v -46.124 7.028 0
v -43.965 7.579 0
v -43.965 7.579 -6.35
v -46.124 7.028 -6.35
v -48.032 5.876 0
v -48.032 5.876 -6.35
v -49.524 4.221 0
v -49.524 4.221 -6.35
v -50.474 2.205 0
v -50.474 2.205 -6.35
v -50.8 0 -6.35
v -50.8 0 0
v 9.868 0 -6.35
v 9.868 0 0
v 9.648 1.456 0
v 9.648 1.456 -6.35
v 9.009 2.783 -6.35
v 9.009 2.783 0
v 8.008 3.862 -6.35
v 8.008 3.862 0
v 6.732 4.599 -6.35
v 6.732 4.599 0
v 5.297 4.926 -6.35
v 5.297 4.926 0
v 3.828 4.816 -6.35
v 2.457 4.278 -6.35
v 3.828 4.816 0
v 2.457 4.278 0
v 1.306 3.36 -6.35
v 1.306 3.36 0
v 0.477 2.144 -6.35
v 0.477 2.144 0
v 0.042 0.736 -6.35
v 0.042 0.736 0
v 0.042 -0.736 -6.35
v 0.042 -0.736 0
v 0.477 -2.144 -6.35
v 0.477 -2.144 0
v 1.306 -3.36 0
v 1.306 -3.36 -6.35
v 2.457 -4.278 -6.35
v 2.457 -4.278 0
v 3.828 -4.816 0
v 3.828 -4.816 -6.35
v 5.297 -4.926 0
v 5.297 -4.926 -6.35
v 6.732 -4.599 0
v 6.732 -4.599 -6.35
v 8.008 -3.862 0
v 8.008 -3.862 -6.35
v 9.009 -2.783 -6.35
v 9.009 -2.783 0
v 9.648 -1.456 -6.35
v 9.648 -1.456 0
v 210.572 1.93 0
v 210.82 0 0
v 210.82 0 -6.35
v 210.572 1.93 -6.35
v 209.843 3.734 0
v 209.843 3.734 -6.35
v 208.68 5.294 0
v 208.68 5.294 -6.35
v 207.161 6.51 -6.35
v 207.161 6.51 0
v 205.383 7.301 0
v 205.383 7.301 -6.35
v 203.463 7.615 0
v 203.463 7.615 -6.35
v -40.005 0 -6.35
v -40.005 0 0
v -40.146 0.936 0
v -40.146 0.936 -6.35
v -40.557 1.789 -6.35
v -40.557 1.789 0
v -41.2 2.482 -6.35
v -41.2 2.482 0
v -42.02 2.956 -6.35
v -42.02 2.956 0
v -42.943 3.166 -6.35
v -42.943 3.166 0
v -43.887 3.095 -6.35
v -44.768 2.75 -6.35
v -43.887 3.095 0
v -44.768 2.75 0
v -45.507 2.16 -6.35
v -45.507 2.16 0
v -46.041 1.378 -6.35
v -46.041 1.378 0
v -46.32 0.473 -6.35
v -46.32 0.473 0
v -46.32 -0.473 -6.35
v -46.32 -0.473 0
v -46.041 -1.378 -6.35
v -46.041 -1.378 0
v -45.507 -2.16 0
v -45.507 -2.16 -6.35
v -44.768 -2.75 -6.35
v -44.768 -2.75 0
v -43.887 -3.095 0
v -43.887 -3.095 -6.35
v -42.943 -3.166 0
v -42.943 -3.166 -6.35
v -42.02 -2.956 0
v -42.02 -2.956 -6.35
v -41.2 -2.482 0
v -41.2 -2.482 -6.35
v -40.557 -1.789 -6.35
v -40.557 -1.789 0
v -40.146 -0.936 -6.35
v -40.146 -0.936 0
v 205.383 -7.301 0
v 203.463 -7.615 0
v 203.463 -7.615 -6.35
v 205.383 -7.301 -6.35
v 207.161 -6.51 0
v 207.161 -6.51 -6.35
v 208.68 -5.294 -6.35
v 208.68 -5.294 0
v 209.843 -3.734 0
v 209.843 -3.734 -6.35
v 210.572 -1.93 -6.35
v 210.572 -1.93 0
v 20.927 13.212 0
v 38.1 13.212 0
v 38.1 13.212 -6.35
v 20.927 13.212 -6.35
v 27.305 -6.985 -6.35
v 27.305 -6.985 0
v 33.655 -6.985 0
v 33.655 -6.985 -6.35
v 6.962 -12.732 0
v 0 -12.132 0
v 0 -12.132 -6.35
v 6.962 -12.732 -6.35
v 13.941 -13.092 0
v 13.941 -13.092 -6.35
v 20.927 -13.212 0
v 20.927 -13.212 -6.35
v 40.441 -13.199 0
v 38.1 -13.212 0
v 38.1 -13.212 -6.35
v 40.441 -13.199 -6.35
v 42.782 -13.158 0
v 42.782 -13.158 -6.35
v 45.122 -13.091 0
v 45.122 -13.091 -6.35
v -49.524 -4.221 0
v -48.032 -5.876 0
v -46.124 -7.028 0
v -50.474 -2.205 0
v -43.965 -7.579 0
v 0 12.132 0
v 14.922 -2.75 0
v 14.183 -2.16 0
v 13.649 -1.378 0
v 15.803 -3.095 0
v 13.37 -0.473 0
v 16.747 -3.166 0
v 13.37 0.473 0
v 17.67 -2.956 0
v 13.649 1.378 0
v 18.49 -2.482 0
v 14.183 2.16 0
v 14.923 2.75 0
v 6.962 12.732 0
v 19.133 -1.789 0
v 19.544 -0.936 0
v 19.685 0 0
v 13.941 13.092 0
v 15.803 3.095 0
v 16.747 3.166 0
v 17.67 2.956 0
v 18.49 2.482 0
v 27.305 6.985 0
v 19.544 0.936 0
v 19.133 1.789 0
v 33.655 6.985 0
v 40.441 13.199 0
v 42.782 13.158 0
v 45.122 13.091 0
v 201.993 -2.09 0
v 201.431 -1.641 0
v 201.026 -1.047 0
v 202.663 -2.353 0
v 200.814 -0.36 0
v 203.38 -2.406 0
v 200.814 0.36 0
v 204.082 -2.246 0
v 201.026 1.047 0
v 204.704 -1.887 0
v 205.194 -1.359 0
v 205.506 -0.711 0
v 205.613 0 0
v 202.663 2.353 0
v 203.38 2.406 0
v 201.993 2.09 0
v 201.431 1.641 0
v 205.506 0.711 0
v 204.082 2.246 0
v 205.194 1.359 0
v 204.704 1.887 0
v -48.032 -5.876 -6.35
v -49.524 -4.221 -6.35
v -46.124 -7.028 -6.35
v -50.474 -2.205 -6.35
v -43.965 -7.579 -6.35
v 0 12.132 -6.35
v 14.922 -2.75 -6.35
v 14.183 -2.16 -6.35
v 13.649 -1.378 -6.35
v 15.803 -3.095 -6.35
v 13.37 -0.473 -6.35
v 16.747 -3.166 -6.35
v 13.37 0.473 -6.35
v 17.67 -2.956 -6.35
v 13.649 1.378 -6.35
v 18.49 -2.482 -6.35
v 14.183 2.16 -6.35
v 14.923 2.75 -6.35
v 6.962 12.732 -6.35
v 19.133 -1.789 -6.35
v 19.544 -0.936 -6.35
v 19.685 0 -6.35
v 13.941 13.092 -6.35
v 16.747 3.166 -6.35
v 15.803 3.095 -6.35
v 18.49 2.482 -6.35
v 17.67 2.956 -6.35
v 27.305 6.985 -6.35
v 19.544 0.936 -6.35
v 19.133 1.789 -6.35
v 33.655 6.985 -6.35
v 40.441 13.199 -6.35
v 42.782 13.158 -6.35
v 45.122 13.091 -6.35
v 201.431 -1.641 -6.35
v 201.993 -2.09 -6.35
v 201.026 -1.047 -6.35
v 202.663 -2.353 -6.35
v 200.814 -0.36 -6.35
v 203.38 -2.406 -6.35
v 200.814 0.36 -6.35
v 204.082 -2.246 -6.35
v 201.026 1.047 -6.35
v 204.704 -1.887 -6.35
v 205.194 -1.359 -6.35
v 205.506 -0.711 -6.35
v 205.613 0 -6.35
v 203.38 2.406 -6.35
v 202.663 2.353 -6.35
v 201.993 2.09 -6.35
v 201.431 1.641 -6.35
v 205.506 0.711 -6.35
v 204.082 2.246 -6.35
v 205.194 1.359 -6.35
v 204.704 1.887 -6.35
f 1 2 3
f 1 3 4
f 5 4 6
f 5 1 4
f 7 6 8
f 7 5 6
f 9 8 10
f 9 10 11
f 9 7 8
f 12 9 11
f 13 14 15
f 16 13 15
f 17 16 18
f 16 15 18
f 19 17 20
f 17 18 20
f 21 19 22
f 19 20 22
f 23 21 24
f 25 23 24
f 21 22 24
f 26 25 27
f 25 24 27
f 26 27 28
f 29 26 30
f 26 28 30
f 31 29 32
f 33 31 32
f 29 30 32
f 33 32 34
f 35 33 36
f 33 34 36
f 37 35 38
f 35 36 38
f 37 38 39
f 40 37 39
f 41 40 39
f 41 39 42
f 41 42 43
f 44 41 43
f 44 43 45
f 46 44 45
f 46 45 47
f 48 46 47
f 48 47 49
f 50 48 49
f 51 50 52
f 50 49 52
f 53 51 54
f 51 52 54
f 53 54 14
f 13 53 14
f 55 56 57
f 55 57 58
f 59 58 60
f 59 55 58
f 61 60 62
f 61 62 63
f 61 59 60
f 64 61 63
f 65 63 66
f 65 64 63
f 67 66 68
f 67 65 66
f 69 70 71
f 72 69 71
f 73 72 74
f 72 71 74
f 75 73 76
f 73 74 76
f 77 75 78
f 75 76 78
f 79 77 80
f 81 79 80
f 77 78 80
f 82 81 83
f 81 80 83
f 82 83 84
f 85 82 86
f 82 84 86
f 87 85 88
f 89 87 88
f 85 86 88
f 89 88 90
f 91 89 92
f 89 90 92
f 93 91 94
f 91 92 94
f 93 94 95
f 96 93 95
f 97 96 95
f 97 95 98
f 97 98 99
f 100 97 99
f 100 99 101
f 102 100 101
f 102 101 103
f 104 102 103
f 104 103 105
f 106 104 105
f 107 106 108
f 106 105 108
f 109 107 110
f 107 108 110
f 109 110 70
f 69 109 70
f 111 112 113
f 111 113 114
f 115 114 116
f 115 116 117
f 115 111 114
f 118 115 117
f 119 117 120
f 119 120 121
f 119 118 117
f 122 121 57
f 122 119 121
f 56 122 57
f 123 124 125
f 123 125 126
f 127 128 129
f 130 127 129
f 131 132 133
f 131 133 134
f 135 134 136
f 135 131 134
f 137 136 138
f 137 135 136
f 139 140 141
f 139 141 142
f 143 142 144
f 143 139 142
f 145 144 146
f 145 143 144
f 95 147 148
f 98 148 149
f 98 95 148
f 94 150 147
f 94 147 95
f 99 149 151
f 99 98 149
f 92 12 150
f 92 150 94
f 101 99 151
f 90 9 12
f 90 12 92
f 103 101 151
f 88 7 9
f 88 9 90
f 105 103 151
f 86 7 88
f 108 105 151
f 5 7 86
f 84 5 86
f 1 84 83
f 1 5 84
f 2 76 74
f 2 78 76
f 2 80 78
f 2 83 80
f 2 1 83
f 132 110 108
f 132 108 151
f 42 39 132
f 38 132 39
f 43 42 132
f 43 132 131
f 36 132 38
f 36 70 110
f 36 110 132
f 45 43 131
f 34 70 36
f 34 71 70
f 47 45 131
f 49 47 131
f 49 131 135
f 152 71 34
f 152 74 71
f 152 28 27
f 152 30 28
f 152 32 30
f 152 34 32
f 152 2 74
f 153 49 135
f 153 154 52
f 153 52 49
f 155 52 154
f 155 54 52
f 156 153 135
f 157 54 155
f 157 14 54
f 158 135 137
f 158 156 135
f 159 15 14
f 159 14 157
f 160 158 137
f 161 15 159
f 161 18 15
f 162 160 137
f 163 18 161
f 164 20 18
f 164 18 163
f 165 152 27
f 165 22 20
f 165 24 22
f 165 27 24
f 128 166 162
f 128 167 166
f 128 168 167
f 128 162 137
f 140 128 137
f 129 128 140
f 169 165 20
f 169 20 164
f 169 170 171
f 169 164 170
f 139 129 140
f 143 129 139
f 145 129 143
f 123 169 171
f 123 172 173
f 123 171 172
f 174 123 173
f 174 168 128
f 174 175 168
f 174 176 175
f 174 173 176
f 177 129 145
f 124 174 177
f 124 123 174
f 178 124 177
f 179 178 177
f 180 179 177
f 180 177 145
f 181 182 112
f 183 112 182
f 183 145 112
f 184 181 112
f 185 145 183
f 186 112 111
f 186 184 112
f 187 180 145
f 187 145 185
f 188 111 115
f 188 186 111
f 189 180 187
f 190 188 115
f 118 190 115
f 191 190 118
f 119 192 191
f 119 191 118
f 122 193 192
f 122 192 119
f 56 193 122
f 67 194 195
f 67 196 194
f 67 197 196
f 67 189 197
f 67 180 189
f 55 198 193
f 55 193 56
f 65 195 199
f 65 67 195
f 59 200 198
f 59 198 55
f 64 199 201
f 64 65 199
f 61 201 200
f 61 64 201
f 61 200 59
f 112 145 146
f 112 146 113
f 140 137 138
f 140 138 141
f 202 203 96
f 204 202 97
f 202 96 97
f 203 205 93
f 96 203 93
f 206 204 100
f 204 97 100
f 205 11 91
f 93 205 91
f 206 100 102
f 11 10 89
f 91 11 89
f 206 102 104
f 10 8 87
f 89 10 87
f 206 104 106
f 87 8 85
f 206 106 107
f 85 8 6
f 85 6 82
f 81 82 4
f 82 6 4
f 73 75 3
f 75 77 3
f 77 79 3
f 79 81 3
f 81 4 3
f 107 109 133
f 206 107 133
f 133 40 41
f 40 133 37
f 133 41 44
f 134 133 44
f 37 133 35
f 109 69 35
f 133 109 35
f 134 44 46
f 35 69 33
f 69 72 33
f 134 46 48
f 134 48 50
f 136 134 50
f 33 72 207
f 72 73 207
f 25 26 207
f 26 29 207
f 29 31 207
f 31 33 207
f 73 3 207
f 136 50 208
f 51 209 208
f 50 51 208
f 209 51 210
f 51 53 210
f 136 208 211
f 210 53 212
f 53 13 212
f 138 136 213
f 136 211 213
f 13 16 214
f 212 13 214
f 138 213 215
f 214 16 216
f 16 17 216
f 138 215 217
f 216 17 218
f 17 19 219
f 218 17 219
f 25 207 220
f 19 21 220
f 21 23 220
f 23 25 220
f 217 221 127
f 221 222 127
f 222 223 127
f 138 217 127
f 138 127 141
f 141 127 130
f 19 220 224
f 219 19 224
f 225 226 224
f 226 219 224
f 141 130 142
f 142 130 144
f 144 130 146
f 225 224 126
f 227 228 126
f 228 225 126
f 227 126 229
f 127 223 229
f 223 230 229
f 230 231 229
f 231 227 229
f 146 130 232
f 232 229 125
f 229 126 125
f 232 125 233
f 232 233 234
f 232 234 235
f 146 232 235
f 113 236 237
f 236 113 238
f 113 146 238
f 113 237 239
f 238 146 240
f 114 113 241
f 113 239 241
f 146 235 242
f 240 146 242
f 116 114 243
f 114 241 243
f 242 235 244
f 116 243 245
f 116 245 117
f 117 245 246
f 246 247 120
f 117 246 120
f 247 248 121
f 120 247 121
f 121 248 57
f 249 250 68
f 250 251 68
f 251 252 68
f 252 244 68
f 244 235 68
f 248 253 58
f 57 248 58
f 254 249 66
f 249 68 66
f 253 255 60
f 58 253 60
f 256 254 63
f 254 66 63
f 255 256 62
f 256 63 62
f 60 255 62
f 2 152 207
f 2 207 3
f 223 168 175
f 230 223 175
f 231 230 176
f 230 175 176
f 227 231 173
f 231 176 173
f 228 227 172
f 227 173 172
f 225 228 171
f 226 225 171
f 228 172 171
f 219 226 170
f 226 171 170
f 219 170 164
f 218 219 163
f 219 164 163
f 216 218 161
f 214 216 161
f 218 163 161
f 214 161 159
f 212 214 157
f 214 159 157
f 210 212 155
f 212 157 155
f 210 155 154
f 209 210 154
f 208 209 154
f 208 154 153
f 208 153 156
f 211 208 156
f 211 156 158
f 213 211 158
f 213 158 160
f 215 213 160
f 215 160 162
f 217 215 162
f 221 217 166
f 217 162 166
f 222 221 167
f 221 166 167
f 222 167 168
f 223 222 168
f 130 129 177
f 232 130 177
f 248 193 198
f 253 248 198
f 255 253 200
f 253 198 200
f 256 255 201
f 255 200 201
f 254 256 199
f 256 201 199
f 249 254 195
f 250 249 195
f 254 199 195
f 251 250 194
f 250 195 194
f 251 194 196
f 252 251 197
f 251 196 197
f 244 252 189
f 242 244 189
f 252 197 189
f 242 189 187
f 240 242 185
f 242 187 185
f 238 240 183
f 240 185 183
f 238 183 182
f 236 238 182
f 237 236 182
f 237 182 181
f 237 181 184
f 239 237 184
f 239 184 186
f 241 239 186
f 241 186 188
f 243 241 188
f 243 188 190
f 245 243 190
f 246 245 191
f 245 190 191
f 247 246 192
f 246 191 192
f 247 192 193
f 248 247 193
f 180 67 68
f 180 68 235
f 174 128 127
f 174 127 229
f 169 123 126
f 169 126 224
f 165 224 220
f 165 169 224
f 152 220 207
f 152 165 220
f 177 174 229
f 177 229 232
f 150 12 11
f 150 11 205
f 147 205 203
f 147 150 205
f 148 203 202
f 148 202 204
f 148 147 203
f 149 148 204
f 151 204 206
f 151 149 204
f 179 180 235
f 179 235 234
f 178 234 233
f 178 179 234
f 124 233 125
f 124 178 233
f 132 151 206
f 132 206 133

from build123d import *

# Parameters (mm, degrees)
F2_DEPTH = 6.35
F3_R     = 3.175
F3_R_2   = 4.9403
F3_R_3   = 2.413
F4_DEPTH = 6.35
F5_W     = 6.35
F5_H     = 13.97
F6_DEPTH = 6.35


with BuildPart() as f2:
    # F1 (on Top) → F2 (new body)
    with BuildSketch(Plane.XY):
        with BuildLine():
            Line((38.1, 13.212064), (20.927279, 13.212064))
            ThreePointArc((20.927279, 13.212064), (10.449702, 12.941757), (0, 12.131556))
            Line((0, 12.131556), (-43.964773, 7.579481))
            ThreePointArc((-43.964773, 7.579481), (-48.838815, 5.103157), (-50.8, 0))
            ThreePointArc((-50.8, 0), (-48.838815, -5.103157), (-43.964773, -7.579481))
            Line((-43.964773, -7.579481), (0, -12.131556))
            ThreePointArc((0, -12.131556), (10.449702, -12.941757), (20.927279, -13.212064))
            Line((20.927279, -13.212064), (38.1, -13.212064))
            ThreePointArc((38.1, -13.212064), (41.611629, -13.181718), (45.12221, -13.090691))
            Line((45.12221, -13.090691), (203.463333, -7.615448))
            ThreePointArc((203.463333, -7.615448), (208.680465, -5.294233), (210.82, 0))
            ThreePointArc((210.82, 0), (208.680465, 5.294233), (203.463333, 7.615448))
            Line((203.463333, 7.615448), (45.12221, 13.090691))
            ThreePointArc((45.12221, 13.090691), (41.611629, 13.181718), (38.1, 13.212064))
        make_face()
    extrude(amount=-F2_DEPTH)

    # F3 (on face) → F4 (cut, through all)
    with BuildSketch(Plane.XY):
        with Locations((-43.18, 0)):
            Circle(F3_R)
        with Locations((16.51, 0)):
            Circle(F3_R)
        with Locations((4.9276, 0)):
            Circle(F3_R_2)
        with Locations((203.2, 0)):
            Circle(F3_R_3)
    extrude(amount=-F4_DEPTH, mode=Mode.SUBTRACT)

    # F5 (on face) → F6 (cut, through all)
    with BuildSketch(Plane.XY):
        with Locations((30.48, 0)):
            Rectangle(F5_W, F5_H)
    extrude(amount=-F6_DEPTH, mode=Mode.SUBTRACT)


solid = f2.part
